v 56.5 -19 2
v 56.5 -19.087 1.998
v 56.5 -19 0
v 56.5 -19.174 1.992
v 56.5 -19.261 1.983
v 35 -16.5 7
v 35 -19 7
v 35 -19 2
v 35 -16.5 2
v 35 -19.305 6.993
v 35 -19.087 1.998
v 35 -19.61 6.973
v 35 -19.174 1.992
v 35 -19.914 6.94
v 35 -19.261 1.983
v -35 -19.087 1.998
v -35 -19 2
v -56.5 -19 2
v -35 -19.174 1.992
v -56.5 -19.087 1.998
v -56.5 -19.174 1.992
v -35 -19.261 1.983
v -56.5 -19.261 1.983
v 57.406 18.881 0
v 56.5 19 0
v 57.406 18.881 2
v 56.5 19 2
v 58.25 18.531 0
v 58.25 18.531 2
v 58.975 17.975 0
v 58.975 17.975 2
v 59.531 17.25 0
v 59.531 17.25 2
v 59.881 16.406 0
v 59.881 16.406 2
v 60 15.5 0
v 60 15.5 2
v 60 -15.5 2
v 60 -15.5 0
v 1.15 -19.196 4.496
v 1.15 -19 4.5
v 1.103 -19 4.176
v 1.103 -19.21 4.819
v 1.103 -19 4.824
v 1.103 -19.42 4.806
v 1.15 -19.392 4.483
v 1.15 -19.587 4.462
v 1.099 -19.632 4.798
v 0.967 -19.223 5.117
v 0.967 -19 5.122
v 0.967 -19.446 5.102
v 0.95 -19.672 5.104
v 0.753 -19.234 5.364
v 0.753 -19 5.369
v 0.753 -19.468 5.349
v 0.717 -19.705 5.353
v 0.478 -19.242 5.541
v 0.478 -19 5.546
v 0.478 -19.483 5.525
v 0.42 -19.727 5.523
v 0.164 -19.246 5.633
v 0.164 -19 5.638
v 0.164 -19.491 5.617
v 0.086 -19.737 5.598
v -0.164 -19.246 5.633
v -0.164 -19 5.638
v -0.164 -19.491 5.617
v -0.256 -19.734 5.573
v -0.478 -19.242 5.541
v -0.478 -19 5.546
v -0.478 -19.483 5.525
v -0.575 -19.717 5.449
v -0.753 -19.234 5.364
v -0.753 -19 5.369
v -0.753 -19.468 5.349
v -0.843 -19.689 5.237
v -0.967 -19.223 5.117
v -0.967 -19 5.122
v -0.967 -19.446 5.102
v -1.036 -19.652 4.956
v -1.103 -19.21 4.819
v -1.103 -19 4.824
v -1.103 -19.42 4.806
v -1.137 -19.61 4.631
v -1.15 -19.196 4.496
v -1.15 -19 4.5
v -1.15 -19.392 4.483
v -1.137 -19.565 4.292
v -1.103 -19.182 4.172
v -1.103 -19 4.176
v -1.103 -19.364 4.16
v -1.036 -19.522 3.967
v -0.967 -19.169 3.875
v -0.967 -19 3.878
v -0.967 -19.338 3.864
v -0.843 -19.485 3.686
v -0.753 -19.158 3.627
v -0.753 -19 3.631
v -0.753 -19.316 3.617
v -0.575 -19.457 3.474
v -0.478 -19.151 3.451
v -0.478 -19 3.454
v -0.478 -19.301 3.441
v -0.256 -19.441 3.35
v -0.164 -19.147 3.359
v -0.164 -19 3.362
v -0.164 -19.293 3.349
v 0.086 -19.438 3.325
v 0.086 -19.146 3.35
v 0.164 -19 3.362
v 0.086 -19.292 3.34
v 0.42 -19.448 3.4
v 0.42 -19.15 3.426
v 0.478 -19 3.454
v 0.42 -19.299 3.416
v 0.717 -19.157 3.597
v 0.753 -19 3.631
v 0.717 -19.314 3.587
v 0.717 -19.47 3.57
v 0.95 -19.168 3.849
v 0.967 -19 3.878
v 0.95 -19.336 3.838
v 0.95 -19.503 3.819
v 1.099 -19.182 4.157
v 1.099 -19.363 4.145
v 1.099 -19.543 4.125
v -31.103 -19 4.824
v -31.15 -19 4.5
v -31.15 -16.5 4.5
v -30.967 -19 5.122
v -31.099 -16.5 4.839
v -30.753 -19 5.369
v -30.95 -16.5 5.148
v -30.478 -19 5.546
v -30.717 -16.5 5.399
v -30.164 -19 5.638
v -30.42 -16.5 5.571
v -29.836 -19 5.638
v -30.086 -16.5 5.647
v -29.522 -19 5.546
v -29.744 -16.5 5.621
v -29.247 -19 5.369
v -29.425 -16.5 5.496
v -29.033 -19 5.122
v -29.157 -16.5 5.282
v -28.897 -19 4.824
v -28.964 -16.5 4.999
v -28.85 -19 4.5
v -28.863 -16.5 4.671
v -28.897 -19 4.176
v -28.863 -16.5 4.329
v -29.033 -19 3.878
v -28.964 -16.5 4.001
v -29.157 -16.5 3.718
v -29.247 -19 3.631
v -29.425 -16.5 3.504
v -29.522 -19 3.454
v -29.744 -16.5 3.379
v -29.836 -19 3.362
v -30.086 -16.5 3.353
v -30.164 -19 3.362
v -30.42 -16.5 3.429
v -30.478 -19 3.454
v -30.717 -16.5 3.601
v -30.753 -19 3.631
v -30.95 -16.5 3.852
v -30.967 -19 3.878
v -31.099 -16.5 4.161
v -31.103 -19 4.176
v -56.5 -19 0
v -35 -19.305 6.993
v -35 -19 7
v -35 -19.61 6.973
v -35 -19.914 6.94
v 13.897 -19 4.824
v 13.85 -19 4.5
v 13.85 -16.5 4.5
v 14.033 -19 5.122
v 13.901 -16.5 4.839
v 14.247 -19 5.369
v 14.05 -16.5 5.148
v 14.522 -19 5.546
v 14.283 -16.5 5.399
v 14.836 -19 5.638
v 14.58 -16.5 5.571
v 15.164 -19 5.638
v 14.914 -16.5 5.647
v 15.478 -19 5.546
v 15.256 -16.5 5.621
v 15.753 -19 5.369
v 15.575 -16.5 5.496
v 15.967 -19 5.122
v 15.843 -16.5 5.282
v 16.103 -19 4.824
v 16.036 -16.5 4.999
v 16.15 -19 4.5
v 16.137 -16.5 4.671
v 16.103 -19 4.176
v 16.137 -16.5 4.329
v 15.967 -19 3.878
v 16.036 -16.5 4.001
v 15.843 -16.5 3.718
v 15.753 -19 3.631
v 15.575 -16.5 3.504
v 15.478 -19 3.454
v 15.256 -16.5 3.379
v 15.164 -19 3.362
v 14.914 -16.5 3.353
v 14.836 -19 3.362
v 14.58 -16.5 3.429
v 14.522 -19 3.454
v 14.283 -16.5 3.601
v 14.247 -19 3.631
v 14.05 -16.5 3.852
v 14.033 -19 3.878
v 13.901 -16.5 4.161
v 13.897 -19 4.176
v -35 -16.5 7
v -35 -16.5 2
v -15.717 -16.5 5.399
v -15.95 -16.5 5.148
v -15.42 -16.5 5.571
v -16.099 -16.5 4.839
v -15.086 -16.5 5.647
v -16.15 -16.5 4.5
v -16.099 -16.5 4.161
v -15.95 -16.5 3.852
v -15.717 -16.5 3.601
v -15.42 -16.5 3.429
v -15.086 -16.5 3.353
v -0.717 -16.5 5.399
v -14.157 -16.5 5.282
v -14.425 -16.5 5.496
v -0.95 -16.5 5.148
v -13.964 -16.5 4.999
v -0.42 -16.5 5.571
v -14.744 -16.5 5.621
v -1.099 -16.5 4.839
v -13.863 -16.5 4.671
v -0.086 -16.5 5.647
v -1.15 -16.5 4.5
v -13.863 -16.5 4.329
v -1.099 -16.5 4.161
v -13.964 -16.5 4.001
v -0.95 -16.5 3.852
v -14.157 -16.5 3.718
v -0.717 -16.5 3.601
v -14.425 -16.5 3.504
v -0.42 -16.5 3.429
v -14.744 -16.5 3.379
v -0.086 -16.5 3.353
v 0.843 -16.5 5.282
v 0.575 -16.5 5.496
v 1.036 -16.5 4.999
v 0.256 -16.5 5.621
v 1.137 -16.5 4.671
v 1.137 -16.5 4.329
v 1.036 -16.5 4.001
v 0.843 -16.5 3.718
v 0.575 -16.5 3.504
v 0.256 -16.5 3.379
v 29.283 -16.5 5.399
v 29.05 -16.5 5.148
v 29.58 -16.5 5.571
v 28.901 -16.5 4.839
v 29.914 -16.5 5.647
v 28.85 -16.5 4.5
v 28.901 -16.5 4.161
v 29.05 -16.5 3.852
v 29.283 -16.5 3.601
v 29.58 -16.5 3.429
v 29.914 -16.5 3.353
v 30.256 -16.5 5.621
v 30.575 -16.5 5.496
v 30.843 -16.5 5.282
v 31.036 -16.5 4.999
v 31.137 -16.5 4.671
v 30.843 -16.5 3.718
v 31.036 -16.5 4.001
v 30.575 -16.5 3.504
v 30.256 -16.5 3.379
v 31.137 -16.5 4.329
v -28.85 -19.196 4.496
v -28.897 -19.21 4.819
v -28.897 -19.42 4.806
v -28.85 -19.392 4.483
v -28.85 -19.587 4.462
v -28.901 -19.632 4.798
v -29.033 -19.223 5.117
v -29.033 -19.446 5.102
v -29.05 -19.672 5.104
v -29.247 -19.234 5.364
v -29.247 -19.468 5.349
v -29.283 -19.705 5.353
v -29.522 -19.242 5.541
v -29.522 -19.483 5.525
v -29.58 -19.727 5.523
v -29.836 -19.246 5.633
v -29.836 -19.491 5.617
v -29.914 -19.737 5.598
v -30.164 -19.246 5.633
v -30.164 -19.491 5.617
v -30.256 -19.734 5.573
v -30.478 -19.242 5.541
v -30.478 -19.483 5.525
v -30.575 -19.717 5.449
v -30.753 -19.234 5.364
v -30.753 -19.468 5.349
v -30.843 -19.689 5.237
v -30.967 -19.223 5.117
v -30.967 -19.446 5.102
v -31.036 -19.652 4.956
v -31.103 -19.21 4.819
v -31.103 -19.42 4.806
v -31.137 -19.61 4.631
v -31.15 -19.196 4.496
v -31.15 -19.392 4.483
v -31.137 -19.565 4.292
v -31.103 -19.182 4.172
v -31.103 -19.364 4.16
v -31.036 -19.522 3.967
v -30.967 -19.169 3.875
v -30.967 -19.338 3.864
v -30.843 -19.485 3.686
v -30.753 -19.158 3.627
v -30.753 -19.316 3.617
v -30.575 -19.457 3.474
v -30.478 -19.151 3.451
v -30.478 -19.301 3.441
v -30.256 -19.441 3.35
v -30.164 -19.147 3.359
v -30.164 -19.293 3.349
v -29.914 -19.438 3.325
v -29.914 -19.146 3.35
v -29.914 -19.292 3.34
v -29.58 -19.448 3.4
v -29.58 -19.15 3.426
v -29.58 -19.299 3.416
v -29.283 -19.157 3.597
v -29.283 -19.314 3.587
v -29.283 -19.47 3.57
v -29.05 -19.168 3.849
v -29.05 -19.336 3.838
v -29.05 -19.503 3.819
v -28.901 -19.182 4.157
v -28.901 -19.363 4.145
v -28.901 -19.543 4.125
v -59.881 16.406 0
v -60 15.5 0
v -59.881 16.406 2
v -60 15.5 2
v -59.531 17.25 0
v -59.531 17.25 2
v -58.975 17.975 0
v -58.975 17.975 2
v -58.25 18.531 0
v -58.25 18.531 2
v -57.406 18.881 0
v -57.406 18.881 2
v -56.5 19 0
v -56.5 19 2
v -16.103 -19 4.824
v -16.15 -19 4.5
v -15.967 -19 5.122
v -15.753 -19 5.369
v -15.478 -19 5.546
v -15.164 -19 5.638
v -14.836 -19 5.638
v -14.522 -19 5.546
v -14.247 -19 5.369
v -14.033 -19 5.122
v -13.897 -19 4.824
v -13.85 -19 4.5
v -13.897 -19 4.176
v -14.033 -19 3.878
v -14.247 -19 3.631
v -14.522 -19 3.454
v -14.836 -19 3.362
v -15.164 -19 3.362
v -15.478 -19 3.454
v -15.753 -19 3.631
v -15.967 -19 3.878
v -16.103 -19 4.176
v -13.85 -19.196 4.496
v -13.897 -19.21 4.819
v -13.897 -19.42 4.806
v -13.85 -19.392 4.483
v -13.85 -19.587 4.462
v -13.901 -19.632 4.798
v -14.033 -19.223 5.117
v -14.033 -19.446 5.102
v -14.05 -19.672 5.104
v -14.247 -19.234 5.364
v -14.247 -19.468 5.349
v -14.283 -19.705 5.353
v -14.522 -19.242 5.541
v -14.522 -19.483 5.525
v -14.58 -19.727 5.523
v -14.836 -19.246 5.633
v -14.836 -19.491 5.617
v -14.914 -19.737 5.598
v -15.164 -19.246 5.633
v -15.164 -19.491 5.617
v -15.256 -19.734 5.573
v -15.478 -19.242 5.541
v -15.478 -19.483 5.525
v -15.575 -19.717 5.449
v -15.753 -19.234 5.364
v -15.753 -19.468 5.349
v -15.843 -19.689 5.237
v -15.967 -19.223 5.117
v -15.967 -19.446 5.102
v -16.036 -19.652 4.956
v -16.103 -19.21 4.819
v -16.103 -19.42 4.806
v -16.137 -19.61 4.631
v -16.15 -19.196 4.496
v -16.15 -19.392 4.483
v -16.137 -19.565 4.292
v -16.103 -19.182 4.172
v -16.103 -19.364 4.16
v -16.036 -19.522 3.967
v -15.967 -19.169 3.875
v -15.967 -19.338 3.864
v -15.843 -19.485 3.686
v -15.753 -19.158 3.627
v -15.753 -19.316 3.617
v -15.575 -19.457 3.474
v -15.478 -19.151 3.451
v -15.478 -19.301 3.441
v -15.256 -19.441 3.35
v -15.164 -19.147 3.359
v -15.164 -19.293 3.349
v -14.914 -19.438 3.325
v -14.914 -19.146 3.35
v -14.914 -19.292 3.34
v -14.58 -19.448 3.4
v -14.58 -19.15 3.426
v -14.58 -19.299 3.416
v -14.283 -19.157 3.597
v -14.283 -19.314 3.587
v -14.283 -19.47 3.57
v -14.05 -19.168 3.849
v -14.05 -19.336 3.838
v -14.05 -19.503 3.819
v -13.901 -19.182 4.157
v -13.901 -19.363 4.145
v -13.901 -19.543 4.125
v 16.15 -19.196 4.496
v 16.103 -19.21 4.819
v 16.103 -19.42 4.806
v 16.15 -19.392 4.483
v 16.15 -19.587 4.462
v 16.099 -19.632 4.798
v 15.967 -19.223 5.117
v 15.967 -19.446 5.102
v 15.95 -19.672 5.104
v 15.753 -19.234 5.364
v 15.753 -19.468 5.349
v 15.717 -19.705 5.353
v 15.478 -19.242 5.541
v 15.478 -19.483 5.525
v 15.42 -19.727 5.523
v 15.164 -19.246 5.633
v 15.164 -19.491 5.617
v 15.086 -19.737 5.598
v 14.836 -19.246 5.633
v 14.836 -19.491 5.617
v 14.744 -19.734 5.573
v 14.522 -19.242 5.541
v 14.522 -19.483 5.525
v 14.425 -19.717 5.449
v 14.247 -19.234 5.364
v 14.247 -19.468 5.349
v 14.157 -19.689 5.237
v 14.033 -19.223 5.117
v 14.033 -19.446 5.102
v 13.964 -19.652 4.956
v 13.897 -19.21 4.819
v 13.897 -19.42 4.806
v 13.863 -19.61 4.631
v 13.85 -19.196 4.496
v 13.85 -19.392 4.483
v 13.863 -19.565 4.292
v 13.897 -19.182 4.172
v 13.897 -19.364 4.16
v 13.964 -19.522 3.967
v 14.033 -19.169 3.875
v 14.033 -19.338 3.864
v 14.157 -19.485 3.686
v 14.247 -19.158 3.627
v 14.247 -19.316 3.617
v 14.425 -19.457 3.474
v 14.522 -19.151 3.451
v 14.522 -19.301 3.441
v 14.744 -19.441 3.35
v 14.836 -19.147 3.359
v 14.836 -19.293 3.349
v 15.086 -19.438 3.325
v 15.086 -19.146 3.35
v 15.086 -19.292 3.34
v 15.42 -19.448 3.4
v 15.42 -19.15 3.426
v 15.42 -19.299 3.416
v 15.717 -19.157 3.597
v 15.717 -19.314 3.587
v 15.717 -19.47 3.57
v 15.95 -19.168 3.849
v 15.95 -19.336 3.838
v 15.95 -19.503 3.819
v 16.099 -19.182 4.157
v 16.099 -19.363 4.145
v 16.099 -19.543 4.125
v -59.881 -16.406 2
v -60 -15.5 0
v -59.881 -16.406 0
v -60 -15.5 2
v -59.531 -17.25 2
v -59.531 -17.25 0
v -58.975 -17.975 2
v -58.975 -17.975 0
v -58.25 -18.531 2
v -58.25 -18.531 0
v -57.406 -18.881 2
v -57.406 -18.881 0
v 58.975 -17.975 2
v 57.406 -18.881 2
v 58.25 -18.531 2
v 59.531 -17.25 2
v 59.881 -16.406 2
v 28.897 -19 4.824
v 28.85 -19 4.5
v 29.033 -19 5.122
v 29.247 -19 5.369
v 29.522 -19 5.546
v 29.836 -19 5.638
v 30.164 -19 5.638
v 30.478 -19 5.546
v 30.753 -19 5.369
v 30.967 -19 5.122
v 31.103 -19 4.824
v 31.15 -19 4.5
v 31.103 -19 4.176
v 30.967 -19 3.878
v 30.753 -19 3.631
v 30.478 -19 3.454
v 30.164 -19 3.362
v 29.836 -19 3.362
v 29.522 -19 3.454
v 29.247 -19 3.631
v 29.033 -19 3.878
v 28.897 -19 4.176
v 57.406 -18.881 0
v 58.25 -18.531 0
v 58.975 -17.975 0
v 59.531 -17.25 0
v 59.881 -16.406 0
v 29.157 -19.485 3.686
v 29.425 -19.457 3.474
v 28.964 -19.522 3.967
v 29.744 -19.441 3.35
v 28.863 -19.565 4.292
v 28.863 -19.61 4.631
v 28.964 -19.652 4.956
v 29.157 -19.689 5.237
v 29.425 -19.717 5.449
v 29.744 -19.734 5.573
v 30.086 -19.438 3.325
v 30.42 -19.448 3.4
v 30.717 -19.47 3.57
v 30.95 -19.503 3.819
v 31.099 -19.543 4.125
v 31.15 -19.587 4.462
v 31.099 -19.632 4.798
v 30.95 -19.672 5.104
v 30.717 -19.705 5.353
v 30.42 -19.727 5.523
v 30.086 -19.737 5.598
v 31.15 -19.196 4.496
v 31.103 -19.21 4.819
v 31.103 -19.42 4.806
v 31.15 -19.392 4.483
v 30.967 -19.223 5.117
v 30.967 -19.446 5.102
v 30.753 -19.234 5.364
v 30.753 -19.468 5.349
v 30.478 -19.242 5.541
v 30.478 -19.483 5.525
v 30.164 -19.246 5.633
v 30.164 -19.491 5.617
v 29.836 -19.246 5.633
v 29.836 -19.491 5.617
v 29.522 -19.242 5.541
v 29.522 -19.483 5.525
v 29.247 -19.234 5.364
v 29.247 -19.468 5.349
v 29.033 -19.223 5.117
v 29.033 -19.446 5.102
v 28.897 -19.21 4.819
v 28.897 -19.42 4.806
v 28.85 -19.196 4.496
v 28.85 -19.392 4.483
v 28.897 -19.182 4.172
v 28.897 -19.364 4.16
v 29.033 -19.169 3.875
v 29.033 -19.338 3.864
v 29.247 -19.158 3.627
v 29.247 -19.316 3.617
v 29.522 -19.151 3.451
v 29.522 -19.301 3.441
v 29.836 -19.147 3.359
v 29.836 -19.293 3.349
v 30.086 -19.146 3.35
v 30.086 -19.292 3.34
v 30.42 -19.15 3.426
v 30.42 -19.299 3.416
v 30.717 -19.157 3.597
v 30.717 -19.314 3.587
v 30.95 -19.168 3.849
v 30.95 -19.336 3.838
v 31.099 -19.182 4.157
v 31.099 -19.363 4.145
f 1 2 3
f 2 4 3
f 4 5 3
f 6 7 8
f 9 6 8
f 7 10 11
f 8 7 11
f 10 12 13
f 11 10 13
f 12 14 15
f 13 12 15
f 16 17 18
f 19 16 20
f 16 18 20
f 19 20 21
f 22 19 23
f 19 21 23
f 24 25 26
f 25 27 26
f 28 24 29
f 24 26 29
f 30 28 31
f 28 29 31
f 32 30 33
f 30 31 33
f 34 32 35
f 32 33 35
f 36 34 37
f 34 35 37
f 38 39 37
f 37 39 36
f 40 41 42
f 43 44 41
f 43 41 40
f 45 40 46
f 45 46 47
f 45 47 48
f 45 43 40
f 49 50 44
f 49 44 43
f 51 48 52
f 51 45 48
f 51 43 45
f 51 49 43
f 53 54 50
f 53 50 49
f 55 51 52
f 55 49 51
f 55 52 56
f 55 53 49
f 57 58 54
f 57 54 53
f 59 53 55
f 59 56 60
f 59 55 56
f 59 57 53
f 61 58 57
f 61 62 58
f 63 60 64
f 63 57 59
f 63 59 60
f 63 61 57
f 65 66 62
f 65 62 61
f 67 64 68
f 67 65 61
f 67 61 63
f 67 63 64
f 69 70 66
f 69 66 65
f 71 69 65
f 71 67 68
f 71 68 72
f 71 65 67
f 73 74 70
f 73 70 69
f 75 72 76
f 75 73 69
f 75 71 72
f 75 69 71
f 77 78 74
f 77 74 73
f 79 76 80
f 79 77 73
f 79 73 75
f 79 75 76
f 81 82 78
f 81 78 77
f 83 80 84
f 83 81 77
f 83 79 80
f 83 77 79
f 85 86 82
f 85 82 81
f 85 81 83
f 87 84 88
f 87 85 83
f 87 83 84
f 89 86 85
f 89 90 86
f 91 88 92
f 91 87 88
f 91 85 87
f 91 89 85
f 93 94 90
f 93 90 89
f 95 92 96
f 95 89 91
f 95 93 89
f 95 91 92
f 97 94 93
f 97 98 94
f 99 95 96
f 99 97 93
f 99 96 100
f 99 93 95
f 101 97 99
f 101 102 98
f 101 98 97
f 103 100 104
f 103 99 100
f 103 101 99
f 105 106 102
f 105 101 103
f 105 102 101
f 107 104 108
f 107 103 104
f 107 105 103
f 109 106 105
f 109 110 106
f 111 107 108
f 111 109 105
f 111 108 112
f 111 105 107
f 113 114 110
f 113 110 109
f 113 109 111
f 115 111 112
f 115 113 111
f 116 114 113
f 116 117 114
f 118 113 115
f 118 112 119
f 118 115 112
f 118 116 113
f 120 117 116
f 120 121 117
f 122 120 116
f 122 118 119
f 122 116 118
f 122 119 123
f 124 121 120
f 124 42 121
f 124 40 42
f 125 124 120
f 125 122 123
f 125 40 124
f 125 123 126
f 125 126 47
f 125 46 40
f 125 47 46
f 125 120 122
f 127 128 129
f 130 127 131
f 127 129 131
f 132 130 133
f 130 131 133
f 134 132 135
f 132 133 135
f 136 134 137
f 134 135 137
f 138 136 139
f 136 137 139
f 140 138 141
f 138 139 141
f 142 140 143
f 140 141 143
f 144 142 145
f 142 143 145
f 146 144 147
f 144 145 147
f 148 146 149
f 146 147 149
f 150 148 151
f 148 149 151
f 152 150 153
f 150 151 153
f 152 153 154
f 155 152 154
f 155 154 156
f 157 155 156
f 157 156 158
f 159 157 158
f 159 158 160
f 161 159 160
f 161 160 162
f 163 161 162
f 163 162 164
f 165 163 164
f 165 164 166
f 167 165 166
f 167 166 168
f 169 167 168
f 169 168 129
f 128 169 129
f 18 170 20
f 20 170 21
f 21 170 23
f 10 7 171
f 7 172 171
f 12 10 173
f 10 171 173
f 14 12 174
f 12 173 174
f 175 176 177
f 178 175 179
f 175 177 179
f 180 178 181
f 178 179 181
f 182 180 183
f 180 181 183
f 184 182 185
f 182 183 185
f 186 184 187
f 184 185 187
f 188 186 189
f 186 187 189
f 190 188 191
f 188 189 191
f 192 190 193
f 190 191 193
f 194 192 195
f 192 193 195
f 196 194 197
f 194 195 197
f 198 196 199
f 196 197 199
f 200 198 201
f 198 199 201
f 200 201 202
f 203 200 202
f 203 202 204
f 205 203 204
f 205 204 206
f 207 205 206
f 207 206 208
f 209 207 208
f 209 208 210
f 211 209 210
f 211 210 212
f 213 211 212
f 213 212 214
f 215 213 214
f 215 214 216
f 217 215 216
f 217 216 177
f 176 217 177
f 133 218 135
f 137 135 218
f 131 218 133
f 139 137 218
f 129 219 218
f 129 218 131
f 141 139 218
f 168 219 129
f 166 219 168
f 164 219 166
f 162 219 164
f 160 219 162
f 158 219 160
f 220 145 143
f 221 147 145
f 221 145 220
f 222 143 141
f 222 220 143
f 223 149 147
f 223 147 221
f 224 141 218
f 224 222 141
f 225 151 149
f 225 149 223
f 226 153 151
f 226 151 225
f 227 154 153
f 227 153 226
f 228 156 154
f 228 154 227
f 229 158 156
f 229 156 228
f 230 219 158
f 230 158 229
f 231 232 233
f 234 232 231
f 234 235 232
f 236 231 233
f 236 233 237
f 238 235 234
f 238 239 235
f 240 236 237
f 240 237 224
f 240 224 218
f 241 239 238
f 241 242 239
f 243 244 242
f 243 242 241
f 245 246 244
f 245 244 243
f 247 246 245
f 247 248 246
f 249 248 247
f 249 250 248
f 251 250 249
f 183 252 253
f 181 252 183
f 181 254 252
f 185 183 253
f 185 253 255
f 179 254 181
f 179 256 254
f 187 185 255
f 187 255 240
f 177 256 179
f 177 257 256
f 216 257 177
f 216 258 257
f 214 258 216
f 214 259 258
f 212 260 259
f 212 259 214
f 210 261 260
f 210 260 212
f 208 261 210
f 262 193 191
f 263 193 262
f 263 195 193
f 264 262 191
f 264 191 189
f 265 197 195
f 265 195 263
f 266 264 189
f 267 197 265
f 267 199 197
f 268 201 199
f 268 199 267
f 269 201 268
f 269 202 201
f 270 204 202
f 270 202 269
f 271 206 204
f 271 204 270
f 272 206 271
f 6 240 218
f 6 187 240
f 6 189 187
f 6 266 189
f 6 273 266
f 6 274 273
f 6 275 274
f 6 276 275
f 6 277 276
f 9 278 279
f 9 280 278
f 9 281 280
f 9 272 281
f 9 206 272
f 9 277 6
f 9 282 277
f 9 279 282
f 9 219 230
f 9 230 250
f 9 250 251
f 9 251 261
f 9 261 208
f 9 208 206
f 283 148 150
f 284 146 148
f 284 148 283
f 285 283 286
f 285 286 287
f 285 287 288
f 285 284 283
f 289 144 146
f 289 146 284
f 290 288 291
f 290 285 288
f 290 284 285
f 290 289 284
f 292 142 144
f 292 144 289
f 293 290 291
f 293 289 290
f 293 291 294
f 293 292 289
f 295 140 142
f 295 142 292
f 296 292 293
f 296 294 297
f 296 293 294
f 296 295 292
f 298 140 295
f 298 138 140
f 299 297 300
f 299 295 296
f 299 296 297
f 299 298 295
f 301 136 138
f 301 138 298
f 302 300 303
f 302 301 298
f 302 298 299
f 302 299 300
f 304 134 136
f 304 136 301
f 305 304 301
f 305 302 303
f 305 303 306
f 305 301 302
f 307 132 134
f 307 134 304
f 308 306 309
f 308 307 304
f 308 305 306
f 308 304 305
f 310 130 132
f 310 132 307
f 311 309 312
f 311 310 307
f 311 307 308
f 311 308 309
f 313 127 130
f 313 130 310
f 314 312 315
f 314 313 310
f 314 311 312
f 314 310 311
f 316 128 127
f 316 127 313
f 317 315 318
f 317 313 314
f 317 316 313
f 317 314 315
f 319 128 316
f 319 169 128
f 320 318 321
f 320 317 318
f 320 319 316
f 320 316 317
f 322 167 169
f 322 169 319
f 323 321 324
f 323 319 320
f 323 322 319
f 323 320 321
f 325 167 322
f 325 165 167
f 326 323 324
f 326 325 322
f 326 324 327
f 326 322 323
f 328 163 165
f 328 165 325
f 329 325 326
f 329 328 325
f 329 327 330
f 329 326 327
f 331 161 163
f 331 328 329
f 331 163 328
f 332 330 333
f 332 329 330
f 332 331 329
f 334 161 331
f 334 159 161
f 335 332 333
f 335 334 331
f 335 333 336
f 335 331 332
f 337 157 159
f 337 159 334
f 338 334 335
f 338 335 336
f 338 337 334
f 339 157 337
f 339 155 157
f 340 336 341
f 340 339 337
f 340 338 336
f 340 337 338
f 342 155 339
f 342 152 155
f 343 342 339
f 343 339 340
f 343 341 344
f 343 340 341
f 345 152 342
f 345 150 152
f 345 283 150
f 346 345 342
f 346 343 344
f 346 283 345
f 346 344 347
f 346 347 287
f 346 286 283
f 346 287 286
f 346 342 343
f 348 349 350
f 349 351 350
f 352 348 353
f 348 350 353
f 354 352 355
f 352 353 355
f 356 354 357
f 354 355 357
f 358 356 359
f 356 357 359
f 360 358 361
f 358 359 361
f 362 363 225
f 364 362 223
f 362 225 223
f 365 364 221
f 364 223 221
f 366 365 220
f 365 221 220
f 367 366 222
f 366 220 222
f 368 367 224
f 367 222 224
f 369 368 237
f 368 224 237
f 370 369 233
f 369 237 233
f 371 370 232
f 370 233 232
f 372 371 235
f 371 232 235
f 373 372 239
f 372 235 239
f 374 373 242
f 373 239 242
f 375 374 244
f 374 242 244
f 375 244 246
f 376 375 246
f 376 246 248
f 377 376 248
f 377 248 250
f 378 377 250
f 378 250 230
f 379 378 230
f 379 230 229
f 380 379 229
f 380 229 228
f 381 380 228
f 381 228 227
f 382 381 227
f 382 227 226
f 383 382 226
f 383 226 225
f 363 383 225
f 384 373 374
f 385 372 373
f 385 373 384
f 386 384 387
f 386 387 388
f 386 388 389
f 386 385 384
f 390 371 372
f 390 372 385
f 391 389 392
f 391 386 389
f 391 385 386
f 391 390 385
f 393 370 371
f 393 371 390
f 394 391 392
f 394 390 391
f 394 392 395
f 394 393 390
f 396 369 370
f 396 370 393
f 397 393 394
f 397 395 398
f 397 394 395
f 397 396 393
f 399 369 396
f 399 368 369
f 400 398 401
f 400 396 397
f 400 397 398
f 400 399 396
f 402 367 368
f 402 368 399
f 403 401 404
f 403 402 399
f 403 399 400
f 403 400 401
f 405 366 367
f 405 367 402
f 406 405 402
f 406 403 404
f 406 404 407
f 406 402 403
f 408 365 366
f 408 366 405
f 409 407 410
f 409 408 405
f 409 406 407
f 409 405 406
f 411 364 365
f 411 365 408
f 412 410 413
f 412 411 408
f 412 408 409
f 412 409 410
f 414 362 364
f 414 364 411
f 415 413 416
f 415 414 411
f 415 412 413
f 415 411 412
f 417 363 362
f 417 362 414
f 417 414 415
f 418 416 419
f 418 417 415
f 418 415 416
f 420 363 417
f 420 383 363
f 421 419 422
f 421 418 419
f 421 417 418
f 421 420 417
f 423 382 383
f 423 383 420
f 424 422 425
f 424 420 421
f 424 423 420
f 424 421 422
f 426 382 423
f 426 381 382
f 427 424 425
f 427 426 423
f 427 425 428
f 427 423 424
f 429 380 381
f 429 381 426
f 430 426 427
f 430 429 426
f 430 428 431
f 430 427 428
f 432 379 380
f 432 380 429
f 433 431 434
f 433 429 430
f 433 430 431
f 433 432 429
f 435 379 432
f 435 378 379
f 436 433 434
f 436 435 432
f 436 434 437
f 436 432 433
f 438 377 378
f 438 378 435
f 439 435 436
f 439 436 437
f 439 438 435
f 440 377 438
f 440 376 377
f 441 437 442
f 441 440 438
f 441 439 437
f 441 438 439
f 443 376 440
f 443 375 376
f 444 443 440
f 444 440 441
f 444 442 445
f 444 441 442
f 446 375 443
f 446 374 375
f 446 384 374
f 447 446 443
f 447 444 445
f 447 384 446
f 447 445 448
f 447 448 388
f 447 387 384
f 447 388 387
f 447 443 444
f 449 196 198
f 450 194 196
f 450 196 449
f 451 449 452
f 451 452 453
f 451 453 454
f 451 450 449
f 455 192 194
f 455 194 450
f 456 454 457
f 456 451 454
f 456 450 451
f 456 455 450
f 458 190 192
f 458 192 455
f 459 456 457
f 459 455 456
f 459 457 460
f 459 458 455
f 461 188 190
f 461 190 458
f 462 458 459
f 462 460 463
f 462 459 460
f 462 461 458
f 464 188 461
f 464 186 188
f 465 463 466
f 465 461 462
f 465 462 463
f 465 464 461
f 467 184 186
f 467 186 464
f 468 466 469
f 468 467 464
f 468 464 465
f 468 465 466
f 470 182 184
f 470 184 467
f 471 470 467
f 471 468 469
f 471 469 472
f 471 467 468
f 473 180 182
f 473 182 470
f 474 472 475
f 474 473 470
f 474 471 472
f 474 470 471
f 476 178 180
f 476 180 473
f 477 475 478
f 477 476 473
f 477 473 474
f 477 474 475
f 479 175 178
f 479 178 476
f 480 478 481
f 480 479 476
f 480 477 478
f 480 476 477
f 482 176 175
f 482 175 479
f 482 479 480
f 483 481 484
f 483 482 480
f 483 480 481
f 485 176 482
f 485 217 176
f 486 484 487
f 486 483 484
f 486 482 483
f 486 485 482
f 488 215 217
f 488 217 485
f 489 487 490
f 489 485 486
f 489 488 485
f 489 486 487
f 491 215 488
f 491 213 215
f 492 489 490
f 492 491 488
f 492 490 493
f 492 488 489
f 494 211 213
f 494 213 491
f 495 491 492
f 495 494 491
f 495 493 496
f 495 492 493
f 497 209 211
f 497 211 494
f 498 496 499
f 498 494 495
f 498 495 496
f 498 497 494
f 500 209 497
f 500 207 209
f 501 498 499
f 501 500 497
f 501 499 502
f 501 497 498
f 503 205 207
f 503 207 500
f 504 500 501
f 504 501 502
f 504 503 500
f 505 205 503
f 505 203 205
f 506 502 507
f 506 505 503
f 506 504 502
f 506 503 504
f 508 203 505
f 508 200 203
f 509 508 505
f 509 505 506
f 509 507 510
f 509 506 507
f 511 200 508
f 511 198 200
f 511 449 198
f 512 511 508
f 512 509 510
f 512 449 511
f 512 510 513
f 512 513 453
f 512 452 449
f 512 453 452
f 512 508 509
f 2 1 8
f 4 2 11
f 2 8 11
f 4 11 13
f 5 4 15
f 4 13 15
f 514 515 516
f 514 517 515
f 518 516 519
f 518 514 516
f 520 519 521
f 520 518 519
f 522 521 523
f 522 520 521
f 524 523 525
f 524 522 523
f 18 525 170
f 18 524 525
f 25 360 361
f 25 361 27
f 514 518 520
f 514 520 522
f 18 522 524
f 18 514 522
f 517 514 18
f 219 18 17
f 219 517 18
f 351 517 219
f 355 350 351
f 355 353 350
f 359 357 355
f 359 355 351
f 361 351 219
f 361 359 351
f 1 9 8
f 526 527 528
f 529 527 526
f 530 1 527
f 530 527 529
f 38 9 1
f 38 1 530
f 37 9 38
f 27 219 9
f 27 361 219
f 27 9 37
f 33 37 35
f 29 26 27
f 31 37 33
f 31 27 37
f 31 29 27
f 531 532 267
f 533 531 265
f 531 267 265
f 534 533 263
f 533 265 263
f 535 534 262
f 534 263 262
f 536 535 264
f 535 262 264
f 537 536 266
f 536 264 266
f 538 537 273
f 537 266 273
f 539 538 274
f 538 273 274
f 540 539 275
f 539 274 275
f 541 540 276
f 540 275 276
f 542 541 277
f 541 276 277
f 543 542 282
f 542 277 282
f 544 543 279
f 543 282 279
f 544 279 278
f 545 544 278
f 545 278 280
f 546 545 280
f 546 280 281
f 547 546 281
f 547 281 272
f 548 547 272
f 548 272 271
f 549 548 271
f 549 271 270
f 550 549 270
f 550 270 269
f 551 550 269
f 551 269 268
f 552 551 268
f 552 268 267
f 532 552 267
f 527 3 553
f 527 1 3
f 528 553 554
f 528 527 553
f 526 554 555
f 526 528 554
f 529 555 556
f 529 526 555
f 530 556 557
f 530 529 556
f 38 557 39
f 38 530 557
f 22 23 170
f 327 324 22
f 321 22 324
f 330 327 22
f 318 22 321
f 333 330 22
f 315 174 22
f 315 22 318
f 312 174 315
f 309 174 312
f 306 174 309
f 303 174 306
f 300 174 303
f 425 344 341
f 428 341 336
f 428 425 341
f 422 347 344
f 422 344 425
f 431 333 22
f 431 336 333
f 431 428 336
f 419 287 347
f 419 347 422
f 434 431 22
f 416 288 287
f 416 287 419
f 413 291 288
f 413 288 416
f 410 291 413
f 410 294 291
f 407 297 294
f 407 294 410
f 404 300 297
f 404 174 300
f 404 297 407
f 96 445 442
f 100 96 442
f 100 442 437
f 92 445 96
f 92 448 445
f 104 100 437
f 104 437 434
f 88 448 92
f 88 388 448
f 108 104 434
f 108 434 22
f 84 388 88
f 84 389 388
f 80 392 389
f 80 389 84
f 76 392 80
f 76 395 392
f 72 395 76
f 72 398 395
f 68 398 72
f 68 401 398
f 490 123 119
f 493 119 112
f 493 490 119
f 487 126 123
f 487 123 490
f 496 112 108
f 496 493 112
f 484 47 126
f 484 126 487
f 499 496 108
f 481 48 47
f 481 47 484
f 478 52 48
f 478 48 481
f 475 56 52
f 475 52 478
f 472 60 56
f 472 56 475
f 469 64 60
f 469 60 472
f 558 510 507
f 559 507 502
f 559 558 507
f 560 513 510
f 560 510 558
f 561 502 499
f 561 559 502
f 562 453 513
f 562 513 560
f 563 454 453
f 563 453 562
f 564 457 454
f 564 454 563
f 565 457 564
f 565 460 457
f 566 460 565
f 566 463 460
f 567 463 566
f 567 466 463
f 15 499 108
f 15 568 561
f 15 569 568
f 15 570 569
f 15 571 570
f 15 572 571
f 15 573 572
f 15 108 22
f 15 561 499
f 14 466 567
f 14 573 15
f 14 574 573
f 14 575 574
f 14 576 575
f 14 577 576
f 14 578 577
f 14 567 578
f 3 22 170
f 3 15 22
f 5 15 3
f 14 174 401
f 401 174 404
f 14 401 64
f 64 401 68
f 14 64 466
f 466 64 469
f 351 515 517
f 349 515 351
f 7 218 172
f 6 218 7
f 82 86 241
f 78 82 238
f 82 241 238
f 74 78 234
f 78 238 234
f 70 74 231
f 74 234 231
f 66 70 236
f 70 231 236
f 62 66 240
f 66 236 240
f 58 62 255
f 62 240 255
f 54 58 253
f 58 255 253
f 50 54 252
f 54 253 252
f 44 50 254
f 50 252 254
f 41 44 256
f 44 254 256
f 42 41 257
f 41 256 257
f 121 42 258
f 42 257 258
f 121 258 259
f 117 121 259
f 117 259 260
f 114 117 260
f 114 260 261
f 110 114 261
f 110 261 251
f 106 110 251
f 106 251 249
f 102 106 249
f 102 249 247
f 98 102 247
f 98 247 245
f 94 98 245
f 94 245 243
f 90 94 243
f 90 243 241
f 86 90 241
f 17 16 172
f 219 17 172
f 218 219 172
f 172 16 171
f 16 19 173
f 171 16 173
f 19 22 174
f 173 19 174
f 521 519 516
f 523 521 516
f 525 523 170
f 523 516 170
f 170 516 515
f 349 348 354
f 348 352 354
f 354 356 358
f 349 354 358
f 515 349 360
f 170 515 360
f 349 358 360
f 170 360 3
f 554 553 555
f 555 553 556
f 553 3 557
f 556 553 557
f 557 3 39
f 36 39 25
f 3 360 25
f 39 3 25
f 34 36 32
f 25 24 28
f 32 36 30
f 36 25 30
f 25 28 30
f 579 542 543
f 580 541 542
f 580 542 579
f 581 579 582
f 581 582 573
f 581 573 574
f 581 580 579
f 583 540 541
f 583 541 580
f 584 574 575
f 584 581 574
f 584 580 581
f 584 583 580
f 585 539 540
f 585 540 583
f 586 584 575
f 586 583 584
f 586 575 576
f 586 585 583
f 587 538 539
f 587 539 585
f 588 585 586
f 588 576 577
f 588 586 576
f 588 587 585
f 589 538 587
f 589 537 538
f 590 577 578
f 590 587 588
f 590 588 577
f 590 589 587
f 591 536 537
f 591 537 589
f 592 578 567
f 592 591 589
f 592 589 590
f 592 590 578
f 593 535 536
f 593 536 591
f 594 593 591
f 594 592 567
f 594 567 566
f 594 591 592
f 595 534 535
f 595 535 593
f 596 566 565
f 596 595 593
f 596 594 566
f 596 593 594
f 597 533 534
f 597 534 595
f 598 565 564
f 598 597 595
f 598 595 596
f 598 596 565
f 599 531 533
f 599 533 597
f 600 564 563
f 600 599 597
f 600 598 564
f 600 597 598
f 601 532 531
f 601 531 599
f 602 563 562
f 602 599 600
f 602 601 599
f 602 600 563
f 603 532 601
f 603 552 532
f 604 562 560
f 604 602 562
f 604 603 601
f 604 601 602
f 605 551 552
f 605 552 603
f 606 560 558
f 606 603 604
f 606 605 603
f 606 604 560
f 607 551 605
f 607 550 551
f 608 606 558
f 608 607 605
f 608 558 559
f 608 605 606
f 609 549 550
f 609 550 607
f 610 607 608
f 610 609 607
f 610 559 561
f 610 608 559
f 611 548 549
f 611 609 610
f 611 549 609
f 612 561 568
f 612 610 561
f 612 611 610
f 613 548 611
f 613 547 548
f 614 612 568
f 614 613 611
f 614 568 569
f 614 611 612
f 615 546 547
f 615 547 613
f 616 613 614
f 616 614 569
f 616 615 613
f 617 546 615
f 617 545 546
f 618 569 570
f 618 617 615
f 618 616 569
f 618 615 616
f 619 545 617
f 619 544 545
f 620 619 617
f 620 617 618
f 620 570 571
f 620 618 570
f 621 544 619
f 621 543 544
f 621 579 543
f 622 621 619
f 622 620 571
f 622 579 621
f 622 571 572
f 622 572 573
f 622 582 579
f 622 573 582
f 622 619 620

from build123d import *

# Parameters (mm, degrees)
F0_W      = 120
F0_H      = 38
F1_DEPTH  = 2
F2_W      = 70
F2_H      = 2.5
F3_DEPTH  = 5
F5_D      = 2.3
F5_DEPTH  = 5
F6_R      = 3.5
F3_FACE_R = 1.15
F7_ANGLE  = -7.5


with BuildPart() as f1:
    # F0 (on Top) → F1 (new body)
    with BuildSketch(Plane.XY):
        Rectangle(F0_W, F0_H)
    extrude(amount=F1_DEPTH)

    # F2 (on face) → F3 (join)
    with BuildSketch(Plane.XY.offset(2)):
        with Locations((0, -17.75)):
            Rectangle(F2_W, F2_H)
    extrude(amount=F3_DEPTH)

    # F5
    with Locations(Plane.XZ.offset(19)):
        with Locations((-30, 4.5), (-15, 4.5), (0, 4.5), (15, 4.5), (30, 4.5)):
            Hole(F5_D / 2, depth=F5_DEPTH)

    # F6
    f6_edges = [f1.edges().sort_by_distance(p)[0] for p in [
        (-60, -19, 1),
        (-60, 19, 1),
        (60, 19, 1),
        (60, -19, 1),
    ]]
    fillet(f6_edges, radius=F6_R)

    # F3_face (on face) → F7 (revolve)
    with BuildSketch(Plane(origin=(0, -19, 3.076271), x_dir=(1, 0, 0), z_dir=(0, -1, 0))):
        Polygon((-56.5, -3.076271), (56.5, -3.076271), (56.5, -1.076271), (35, -1.076271), (35, 3.923729), (-35, 3.923729), (-35, -1.076271), (-56.5, -1.076271), align=None)
        with Locations((-30, 1.423729)):
            Circle(F3_FACE_R, mode=Mode.SUBTRACT)
        with Locations((-15, 1.423729)):
            Circle(F3_FACE_R, mode=Mode.SUBTRACT)
        with Locations((0, 1.423729)):
            Circle(F3_FACE_R, mode=Mode.SUBTRACT)
        with Locations((15, 1.423729)):
            Circle(F3_FACE_R, mode=Mode.SUBTRACT)
        with Locations((30, 1.423729)):
            Circle(F3_FACE_R, mode=Mode.SUBTRACT)
    revolve(axis=Axis((0, -19, 0), (-1, 0, 0)), revolution_arc=F7_ANGLE)


solid = f1.part
